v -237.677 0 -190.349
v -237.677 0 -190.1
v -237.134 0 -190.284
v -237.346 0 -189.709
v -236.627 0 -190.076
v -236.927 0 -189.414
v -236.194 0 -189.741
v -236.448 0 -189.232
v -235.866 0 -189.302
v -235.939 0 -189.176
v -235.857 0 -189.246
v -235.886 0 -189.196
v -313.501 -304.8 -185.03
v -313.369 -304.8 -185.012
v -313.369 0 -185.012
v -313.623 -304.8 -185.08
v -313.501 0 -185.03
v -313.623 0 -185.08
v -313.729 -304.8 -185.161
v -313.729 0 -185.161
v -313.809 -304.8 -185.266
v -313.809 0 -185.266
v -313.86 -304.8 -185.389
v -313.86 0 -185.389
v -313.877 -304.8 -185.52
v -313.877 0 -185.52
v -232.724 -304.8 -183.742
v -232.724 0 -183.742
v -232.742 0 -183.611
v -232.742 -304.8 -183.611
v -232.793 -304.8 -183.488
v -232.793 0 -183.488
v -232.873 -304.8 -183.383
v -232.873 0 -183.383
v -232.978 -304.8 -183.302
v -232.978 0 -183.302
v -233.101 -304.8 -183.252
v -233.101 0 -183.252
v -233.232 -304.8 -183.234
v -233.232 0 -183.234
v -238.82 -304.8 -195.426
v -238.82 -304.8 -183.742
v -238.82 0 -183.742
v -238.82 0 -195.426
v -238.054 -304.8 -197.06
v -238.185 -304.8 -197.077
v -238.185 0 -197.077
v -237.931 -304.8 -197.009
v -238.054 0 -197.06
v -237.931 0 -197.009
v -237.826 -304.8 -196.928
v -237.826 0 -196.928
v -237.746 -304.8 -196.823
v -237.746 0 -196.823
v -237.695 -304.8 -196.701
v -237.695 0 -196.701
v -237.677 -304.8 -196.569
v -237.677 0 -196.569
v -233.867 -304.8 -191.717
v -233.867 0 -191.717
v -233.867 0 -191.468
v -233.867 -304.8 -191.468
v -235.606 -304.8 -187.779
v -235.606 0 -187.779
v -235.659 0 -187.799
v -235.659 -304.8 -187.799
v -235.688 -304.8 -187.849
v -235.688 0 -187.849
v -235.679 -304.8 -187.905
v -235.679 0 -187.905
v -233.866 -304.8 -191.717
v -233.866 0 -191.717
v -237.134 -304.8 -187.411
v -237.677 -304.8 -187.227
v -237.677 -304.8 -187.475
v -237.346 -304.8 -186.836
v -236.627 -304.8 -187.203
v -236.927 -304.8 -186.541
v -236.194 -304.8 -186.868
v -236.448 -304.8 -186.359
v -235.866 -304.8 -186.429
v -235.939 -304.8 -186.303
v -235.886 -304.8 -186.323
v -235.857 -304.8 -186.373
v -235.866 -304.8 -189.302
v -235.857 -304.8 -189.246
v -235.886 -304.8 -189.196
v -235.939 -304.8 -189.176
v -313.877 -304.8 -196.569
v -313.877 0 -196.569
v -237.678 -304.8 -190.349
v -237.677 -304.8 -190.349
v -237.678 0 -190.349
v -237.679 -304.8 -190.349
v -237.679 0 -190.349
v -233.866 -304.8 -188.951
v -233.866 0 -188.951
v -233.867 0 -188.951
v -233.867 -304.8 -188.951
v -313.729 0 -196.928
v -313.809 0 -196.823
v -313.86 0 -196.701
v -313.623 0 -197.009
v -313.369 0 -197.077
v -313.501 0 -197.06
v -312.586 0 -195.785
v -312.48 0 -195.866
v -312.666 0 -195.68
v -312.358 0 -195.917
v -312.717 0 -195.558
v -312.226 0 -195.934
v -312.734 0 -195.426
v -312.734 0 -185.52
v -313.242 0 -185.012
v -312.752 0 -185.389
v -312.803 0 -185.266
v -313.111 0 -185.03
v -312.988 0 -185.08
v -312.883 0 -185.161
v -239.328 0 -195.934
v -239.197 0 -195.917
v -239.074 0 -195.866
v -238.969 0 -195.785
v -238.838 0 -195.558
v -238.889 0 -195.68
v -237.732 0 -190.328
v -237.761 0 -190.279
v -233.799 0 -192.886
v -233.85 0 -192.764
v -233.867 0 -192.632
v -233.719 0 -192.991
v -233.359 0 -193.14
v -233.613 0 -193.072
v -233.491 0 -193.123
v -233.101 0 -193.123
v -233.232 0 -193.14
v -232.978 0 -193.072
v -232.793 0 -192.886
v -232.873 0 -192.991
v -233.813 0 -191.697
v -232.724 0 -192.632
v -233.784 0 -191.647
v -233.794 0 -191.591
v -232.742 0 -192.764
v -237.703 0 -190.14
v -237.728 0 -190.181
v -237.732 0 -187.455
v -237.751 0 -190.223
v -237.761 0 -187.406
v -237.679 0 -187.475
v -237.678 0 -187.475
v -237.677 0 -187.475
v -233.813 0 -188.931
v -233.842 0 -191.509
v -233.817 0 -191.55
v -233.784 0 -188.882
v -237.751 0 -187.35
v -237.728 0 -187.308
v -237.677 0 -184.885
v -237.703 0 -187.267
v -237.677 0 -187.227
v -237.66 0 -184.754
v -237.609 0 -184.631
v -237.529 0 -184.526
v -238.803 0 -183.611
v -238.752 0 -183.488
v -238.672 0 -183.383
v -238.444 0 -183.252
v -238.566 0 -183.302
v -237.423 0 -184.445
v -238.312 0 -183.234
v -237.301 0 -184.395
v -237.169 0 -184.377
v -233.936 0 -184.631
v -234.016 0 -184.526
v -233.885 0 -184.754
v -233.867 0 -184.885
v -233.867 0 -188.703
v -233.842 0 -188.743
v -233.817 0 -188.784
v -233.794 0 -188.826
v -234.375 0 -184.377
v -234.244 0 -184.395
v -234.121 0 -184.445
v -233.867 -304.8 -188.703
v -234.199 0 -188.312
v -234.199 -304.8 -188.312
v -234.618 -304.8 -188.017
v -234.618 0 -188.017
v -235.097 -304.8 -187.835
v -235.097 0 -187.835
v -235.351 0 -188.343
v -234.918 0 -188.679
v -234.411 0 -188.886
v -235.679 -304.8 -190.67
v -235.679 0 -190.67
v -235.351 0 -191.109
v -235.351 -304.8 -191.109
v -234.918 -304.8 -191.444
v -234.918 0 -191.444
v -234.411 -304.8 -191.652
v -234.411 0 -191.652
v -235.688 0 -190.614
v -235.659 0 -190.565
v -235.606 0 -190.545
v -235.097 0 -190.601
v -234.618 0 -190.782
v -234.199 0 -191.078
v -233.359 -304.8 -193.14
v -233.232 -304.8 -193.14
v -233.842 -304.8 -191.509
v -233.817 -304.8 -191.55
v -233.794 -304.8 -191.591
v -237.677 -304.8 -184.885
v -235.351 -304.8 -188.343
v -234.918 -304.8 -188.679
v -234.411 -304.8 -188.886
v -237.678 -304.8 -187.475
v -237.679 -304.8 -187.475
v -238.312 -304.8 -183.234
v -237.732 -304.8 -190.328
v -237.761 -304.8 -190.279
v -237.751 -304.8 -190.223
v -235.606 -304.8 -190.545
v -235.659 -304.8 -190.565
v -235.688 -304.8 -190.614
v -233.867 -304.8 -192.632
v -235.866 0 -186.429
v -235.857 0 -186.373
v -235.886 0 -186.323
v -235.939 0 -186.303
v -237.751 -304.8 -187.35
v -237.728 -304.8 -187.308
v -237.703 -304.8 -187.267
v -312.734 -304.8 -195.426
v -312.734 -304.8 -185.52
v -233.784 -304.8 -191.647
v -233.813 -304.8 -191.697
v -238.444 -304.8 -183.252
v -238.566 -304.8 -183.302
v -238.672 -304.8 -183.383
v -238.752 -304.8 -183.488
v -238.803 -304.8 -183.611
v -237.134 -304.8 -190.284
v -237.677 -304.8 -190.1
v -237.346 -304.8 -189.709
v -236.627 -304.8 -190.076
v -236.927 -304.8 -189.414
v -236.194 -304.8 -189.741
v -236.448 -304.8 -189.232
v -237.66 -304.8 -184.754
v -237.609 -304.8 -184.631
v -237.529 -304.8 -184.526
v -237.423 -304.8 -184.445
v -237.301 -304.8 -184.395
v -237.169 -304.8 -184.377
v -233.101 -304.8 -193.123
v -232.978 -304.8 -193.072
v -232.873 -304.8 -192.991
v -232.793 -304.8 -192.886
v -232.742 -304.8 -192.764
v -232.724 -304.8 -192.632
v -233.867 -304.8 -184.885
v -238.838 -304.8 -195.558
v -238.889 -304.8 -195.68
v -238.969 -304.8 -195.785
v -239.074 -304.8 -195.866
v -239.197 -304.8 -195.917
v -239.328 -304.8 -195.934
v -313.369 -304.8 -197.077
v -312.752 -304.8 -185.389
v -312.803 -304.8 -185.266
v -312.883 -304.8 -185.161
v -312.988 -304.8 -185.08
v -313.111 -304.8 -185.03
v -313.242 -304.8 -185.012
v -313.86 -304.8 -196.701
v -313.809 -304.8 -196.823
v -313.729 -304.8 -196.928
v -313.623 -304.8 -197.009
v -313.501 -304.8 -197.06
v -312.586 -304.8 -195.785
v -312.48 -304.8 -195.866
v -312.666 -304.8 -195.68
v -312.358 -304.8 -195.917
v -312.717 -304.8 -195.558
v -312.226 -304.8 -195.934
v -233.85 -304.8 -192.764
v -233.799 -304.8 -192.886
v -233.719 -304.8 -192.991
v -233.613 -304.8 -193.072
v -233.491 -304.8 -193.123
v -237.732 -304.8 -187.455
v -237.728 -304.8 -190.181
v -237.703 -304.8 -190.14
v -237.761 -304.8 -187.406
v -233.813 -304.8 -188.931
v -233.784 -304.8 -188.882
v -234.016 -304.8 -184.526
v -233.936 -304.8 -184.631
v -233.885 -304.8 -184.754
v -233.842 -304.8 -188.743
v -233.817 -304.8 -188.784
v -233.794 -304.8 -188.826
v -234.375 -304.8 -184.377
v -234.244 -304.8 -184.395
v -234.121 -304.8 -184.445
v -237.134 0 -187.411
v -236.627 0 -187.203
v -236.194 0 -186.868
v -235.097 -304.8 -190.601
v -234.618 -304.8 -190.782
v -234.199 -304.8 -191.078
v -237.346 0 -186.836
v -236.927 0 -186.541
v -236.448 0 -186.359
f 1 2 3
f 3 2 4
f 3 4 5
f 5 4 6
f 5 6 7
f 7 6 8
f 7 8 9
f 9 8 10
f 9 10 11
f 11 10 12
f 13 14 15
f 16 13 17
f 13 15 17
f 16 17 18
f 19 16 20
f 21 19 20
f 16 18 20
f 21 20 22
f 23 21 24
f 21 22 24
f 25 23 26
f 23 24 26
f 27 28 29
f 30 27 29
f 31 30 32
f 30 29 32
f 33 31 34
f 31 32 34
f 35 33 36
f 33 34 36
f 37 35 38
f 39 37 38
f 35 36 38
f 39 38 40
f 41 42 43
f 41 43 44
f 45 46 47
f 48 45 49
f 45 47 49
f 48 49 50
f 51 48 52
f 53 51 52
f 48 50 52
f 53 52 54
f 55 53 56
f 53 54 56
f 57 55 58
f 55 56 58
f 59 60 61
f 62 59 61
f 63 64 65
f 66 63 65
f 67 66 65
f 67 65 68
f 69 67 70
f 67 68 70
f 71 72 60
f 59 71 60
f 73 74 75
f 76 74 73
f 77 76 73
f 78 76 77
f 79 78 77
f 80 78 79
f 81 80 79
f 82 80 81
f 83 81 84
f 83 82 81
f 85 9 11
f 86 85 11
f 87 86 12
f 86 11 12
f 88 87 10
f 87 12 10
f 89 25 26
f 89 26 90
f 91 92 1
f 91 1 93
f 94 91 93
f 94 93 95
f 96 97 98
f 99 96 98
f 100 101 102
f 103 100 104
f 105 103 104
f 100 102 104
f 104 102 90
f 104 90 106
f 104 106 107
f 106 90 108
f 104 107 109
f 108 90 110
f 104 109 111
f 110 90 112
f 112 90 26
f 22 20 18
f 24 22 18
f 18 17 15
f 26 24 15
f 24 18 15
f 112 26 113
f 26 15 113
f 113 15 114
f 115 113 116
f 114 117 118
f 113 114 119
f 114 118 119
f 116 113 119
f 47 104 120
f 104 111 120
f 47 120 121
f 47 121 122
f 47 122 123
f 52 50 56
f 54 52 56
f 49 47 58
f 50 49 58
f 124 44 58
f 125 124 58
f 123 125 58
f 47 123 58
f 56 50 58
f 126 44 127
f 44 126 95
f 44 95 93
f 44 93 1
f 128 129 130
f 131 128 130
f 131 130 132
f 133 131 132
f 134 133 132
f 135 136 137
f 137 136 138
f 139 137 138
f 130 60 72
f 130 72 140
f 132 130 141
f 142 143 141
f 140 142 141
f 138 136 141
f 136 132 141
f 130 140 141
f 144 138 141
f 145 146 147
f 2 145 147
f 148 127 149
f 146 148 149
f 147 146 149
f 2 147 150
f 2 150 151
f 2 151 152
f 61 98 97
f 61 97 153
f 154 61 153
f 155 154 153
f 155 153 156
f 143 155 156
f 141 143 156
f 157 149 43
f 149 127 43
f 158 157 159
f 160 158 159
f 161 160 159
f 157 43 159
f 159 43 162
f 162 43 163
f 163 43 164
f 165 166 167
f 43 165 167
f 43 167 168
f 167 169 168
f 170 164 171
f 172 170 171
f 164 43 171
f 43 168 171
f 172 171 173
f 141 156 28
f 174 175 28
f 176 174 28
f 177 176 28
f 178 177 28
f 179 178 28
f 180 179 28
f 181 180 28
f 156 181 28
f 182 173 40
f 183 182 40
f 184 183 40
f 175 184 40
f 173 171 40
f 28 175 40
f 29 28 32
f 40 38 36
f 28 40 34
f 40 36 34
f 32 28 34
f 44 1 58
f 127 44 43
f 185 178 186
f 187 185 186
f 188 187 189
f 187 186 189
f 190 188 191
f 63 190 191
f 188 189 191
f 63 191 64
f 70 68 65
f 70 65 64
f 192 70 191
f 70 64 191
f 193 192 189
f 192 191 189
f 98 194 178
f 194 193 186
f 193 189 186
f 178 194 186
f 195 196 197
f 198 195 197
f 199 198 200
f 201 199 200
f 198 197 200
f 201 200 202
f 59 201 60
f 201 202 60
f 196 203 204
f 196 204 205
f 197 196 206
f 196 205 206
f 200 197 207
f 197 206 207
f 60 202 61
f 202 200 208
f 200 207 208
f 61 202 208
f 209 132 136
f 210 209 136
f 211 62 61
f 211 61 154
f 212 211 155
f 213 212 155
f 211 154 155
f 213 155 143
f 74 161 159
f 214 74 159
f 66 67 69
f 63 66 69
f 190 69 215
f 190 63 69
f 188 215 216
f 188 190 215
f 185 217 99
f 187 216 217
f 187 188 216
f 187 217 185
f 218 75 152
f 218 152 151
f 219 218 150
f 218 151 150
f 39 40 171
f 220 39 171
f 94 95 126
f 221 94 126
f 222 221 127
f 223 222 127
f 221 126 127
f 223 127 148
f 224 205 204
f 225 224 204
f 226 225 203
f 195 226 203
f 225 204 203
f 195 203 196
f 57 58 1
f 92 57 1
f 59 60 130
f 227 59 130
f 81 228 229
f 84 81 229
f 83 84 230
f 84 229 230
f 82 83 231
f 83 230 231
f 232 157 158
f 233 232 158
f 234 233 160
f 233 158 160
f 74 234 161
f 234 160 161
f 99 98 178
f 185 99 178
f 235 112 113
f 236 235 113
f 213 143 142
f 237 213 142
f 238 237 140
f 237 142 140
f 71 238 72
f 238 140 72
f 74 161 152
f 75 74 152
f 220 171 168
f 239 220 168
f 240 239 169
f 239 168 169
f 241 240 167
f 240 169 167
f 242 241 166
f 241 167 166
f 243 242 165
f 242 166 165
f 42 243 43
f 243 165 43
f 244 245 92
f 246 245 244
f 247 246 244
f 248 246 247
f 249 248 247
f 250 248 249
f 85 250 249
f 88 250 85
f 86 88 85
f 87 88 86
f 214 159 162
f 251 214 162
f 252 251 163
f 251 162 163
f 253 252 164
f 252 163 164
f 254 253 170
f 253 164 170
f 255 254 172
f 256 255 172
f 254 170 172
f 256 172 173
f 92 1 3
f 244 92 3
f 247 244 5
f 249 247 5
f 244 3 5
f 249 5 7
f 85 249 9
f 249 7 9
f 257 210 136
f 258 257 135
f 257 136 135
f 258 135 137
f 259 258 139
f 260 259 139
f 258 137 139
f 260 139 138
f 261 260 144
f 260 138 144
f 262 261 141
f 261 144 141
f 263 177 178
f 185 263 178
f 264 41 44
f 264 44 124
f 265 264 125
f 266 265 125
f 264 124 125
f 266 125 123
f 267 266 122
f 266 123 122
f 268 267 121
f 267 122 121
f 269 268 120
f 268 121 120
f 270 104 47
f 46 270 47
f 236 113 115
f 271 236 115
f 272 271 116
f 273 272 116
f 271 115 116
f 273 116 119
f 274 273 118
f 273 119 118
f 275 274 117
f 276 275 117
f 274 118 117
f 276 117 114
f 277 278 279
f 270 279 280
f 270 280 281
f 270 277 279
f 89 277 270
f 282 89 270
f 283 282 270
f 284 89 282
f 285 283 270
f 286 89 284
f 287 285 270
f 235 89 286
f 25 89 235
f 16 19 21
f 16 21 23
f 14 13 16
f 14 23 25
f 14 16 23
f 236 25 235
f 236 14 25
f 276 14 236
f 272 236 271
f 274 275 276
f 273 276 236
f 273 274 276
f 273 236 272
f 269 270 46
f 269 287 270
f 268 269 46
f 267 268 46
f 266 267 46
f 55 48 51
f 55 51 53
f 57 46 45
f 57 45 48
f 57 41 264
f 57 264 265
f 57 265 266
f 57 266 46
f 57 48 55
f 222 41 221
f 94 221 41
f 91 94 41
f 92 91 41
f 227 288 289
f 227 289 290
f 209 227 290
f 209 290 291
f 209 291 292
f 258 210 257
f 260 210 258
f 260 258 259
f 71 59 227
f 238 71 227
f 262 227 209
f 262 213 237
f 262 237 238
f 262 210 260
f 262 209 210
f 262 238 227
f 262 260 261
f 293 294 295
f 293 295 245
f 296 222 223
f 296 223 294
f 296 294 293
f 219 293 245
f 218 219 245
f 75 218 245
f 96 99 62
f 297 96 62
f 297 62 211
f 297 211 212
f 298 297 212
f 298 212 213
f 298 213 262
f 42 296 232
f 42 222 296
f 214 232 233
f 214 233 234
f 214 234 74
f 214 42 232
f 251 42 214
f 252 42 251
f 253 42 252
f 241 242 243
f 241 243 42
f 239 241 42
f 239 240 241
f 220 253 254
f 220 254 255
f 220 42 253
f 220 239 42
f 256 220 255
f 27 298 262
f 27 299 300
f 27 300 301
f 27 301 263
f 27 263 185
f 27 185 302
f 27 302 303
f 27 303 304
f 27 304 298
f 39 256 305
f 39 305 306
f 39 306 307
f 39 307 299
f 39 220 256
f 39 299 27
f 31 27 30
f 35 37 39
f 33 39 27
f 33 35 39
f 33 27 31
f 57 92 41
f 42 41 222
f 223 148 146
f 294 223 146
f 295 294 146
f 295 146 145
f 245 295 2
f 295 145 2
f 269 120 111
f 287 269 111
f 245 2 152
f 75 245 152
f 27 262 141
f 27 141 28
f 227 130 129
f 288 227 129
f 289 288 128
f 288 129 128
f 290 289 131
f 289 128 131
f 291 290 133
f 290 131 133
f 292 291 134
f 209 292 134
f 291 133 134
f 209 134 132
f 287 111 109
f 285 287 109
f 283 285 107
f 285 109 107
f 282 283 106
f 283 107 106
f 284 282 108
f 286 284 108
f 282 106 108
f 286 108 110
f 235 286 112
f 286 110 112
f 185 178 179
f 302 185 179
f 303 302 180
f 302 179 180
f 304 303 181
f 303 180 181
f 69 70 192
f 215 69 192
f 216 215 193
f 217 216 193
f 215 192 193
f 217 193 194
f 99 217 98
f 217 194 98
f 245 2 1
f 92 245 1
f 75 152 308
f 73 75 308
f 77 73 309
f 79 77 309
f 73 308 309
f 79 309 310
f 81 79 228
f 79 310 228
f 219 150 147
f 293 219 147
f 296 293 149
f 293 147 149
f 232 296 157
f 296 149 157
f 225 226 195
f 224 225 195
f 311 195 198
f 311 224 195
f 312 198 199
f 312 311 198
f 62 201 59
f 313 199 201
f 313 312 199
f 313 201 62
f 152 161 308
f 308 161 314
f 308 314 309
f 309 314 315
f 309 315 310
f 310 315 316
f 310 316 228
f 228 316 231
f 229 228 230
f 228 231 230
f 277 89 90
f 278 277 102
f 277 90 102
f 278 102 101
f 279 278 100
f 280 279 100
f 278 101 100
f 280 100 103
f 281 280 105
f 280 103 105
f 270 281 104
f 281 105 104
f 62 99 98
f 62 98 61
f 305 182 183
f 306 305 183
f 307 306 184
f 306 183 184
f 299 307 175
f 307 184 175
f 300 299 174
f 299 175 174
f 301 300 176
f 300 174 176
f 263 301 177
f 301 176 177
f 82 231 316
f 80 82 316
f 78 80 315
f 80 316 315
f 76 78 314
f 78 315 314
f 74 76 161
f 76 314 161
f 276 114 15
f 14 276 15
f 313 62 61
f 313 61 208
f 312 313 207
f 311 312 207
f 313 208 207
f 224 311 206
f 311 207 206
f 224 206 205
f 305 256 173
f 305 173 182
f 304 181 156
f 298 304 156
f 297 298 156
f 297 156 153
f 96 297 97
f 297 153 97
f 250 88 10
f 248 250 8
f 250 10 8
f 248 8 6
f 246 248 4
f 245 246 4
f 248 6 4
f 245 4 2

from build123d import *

# Parameters (mm, degrees)
F1_DEPTH = 609.6
F2_SCALE = 0.5


# Not quite as in the source:
# - ends of sketch curves that miss each other by under 0.0002 mm in the source are joined


with BuildPart() as f1:
    # F0 (on Front) → F1 (new body)
    with BuildSketch(Plane.XZ):
        with BuildLine():
            Line((-475.3549548, -393.1385076), (-475.3549548, -380.6970975265))
            ThreePointArc((-475.3549548, -380.6970975265), (-475.3563898659, -380.697073864), (-475.3578249233, -380.6970496949))
            ThreePointArc((-475.3578249233, -380.6970496949), (-475.5014064418, -380.6125311151), (-475.5028342338, -380.4459240484))
            ThreePointArc((-475.5028342338, -380.4459240484), (-475.4310666689, -380.3217397475), (-475.3549548, -380.2001693517))
            Line((-475.3549548, -380.2001693517), (-475.3549548, -374.9508555265))
            ThreePointArc((-475.3549548, -374.9508555265), (-475.356390082, -374.9508318604), (-475.3578253555, -374.9508076876))
            ThreePointArc((-475.3578253555, -374.9508076876), (-475.5014064418, -374.8662637151), (-475.5028342338, -374.6996566484))
            ThreePointArc((-475.5028342338, -374.6996566484), (-475.4310609426, -374.5754882319), (-475.3549548, -374.4539273517))
            Line((-475.3549548, -374.4539273517), (-475.3549548, -369.7705076))
            ThreePointArc((-475.3549548, -369.7705076), (-475.0573752897, -369.0520871103), (-474.3389548, -368.7545076))
            Line((-474.3389548, -368.7545076), (-468.7509548, -368.7545076))
            ThreePointArc((-468.7509548, -368.7545076), (-468.0325343103, -369.0520871103), (-467.7349548, -369.7705076))
            Line((-467.7349548, -369.7705076), (-467.7349548, -377.4055678497))
            ThreePointArc((-467.7349548, -377.4055678497), (-467.6588433745, -377.5271215868), (-467.5870659133, -377.6512838039))
            ThreePointArc((-467.5870659133, -377.6512838039), (-467.5884969176, -377.8178853065), (-467.7320596244, -377.9024198158))
            ThreePointArc((-467.7320596244, -377.9024198158), (-467.7335070711, -377.9024602361), (-467.7349548, -377.9024841911))
            Line((-467.7349548, -377.9024841911), (-467.7349548, -382.9365702497))
            ThreePointArc((-467.7349548, -382.9365702497), (-467.6588433745, -383.0581239868), (-467.5870659133, -383.1822862039))
            ThreePointArc((-467.5870659133, -383.1822862039), (-467.5884968089, -383.3488875182), (-467.7320591896, -383.4334222084))
            ThreePointArc((-467.7320591896, -383.4334222084), (-467.7335068543, -383.4334626325), (-467.7349548, -383.4334865911))
            Line((-467.7349548, -383.4334865911), (-467.7349548, -385.2645076))
            ThreePointArc((-467.7349548, -385.2645076), (-467.4373752897, -385.9829280897), (-466.7189548, -386.2805076))
            Line((-466.7189548, -386.2805076), (-466.4649548, -386.2805076))
            ThreePointArc((-466.4649548, -386.2805076), (-465.7465343103, -385.9829280897), (-465.4489548, -385.2645076))
            Line((-465.4489548, -385.2645076), (-465.4489548, -367.4845076))
            ThreePointArc((-465.4489548, -367.4845076), (-465.7465343103, -366.7660871103), (-466.4649548, -366.4685076))
            Line((-466.4649548, -366.4685076), (-476.6249548, -366.4685076))
            ThreePointArc((-476.6249548, -366.4685076), (-477.3433752897, -366.7660871103), (-477.6409548, -367.4845076))
            Line((-477.6409548, -367.4845076), (-477.6409548, -390.8525076))
            ThreePointArc((-477.6409548, -390.8525076), (-477.9385343103, -391.5709280897), (-478.6569548, -391.8685076))
            Line((-478.6569548, -391.8685076), (-624.4529548, -391.8685076))
            ThreePointArc((-624.4529548, -391.8685076), (-625.1713752897, -391.5709280897), (-625.4689548, -390.8525076))
            Line((-625.4689548, -390.8525076), (-625.4689548, -371.0405076))
            ThreePointArc((-625.4689548, -371.0405076), (-625.7665343103, -370.3220871103), (-626.4849548, -370.0245076))
            Line((-626.4849548, -370.0245076), (-626.7389548, -370.0245076))
            ThreePointArc((-626.7389548, -370.0245076), (-627.4573752897, -370.3220871103), (-627.7549548, -371.0405076))
            Line((-627.7549548, -371.0405076), (-627.7549548, -393.1385076))
            ThreePointArc((-627.7549548, -393.1385076), (-627.4573752897, -393.8569280897), (-626.7389548, -394.1545076))
            Line((-626.7389548, -394.1545076), (-476.3709548, -394.1545076))
            ThreePointArc((-476.3709548, -394.1545076), (-475.6525343103, -393.8569280897), (-475.3549548, -393.1385076))
        make_face()
    extrude(amount=F1_DEPTH)


with BuildPart() as f1b:
    # F0 (on Front) → F1, piece 2 (new body)
    with BuildSketch(Plane.XZ):
        with BuildLine():
            Line((-475.3549548, -374.4539273517), (-475.3549548, -374.9508555265))
            ThreePointArc((-475.3549548, -374.9508555265), (-473.2540858532, -374.4057852487), (-471.7328988759, -372.8576437436))
            ThreePointArc((-471.7328988759, -372.8576437436), (-471.7343450388, -372.6910369501), (-471.8779233823, -372.6065181587))
            ThreePointArc((-471.8779233823, -372.6065181587), (-473.8549585951, -373.0813038086), (-475.3549548, -374.4539273517))
        make_face()
    extrude(amount=F1_DEPTH)


with BuildPart() as f1c:
    # F0 (on Front) → F1, piece 3 (new body)
    with BuildSketch(Plane.XZ):
        with BuildLine():
            Line((-467.7349548, -377.9024841911), (-467.7349548, -377.4055678497))
            ThreePointArc((-467.7349548, -377.4055678497), (-469.2350389344, -376.0330252213), (-471.2121130491, -375.5583636344))
            ThreePointArc((-471.2121130491, -375.5583636344), (-471.355694534, -375.6429030983), (-471.3571224338, -375.8095103516))
            ThreePointArc((-471.3571224338, -375.8095103516), (-469.835840158, -377.3575402656), (-467.7349548, -377.9024841911))
        make_face()
    extrude(amount=F1_DEPTH)


with BuildPart() as f1d:
    # F0 (on Front) → F1, piece 4 (new body)
    with BuildSketch(Plane.XZ):
        with BuildLine():
            ThreePointArc((-475.3549548, -380.6970975265), (-473.2540954687, -380.1520328055), (-471.7329096502, -378.6039051668))
            ThreePointArc((-471.7329096502, -378.6039051668), (-471.7343450388, -378.4373043501), (-471.8779233823, -378.3527855587))
            ThreePointArc((-471.8779233823, -378.3527855587), (-473.8549584042, -378.8275457072), (-475.3549548, -380.2001693517))
            Line((-475.3549548, -380.2001693517), (-475.3549548, -380.6970975265))
        make_face()
    extrude(amount=F1_DEPTH)


with BuildPart() as f1e:
    # F0 (on Front) → F1, piece 5 (new body)
    with BuildSketch(Plane.XZ):
        with BuildLine():
            Line((-467.7349548, -383.4334865911), (-467.7349548, -382.9365702497))
            ThreePointArc((-467.7349548, -382.9365702497), (-469.2350389344, -381.5640276213), (-471.2121130491, -381.0893660344))
            ThreePointArc((-471.2121130491, -381.0893660344), (-471.3557001943, -381.1738899017), (-471.3571116581, -381.3405067716))
            ThreePointArc((-471.3571116581, -381.3405067716), (-469.835840158, -382.8885426656), (-467.7349548, -383.4334865911))
        make_face()
    extrude(amount=F1_DEPTH)


with BuildPart() as f1d_1:
    # F2: moved
    add(f1d.part.scale(F2_SCALE))


with BuildPart() as f1_1:
    # F2: moved
    add(f1.part.scale(F2_SCALE))


with BuildPart() as f1b_1:
    # F2: moved
    add(f1b.part.scale(F2_SCALE))


with BuildPart() as f1e_1:
    # F2: moved
    add(f1e.part.scale(F2_SCALE))


with BuildPart() as f1c_1:
    # F2: moved
    add(f1c.part.scale(F2_SCALE))


solid = Compound([f1d_1.part, f1_1.part, f1b_1.part, f1e_1.part, f1c_1.part])
